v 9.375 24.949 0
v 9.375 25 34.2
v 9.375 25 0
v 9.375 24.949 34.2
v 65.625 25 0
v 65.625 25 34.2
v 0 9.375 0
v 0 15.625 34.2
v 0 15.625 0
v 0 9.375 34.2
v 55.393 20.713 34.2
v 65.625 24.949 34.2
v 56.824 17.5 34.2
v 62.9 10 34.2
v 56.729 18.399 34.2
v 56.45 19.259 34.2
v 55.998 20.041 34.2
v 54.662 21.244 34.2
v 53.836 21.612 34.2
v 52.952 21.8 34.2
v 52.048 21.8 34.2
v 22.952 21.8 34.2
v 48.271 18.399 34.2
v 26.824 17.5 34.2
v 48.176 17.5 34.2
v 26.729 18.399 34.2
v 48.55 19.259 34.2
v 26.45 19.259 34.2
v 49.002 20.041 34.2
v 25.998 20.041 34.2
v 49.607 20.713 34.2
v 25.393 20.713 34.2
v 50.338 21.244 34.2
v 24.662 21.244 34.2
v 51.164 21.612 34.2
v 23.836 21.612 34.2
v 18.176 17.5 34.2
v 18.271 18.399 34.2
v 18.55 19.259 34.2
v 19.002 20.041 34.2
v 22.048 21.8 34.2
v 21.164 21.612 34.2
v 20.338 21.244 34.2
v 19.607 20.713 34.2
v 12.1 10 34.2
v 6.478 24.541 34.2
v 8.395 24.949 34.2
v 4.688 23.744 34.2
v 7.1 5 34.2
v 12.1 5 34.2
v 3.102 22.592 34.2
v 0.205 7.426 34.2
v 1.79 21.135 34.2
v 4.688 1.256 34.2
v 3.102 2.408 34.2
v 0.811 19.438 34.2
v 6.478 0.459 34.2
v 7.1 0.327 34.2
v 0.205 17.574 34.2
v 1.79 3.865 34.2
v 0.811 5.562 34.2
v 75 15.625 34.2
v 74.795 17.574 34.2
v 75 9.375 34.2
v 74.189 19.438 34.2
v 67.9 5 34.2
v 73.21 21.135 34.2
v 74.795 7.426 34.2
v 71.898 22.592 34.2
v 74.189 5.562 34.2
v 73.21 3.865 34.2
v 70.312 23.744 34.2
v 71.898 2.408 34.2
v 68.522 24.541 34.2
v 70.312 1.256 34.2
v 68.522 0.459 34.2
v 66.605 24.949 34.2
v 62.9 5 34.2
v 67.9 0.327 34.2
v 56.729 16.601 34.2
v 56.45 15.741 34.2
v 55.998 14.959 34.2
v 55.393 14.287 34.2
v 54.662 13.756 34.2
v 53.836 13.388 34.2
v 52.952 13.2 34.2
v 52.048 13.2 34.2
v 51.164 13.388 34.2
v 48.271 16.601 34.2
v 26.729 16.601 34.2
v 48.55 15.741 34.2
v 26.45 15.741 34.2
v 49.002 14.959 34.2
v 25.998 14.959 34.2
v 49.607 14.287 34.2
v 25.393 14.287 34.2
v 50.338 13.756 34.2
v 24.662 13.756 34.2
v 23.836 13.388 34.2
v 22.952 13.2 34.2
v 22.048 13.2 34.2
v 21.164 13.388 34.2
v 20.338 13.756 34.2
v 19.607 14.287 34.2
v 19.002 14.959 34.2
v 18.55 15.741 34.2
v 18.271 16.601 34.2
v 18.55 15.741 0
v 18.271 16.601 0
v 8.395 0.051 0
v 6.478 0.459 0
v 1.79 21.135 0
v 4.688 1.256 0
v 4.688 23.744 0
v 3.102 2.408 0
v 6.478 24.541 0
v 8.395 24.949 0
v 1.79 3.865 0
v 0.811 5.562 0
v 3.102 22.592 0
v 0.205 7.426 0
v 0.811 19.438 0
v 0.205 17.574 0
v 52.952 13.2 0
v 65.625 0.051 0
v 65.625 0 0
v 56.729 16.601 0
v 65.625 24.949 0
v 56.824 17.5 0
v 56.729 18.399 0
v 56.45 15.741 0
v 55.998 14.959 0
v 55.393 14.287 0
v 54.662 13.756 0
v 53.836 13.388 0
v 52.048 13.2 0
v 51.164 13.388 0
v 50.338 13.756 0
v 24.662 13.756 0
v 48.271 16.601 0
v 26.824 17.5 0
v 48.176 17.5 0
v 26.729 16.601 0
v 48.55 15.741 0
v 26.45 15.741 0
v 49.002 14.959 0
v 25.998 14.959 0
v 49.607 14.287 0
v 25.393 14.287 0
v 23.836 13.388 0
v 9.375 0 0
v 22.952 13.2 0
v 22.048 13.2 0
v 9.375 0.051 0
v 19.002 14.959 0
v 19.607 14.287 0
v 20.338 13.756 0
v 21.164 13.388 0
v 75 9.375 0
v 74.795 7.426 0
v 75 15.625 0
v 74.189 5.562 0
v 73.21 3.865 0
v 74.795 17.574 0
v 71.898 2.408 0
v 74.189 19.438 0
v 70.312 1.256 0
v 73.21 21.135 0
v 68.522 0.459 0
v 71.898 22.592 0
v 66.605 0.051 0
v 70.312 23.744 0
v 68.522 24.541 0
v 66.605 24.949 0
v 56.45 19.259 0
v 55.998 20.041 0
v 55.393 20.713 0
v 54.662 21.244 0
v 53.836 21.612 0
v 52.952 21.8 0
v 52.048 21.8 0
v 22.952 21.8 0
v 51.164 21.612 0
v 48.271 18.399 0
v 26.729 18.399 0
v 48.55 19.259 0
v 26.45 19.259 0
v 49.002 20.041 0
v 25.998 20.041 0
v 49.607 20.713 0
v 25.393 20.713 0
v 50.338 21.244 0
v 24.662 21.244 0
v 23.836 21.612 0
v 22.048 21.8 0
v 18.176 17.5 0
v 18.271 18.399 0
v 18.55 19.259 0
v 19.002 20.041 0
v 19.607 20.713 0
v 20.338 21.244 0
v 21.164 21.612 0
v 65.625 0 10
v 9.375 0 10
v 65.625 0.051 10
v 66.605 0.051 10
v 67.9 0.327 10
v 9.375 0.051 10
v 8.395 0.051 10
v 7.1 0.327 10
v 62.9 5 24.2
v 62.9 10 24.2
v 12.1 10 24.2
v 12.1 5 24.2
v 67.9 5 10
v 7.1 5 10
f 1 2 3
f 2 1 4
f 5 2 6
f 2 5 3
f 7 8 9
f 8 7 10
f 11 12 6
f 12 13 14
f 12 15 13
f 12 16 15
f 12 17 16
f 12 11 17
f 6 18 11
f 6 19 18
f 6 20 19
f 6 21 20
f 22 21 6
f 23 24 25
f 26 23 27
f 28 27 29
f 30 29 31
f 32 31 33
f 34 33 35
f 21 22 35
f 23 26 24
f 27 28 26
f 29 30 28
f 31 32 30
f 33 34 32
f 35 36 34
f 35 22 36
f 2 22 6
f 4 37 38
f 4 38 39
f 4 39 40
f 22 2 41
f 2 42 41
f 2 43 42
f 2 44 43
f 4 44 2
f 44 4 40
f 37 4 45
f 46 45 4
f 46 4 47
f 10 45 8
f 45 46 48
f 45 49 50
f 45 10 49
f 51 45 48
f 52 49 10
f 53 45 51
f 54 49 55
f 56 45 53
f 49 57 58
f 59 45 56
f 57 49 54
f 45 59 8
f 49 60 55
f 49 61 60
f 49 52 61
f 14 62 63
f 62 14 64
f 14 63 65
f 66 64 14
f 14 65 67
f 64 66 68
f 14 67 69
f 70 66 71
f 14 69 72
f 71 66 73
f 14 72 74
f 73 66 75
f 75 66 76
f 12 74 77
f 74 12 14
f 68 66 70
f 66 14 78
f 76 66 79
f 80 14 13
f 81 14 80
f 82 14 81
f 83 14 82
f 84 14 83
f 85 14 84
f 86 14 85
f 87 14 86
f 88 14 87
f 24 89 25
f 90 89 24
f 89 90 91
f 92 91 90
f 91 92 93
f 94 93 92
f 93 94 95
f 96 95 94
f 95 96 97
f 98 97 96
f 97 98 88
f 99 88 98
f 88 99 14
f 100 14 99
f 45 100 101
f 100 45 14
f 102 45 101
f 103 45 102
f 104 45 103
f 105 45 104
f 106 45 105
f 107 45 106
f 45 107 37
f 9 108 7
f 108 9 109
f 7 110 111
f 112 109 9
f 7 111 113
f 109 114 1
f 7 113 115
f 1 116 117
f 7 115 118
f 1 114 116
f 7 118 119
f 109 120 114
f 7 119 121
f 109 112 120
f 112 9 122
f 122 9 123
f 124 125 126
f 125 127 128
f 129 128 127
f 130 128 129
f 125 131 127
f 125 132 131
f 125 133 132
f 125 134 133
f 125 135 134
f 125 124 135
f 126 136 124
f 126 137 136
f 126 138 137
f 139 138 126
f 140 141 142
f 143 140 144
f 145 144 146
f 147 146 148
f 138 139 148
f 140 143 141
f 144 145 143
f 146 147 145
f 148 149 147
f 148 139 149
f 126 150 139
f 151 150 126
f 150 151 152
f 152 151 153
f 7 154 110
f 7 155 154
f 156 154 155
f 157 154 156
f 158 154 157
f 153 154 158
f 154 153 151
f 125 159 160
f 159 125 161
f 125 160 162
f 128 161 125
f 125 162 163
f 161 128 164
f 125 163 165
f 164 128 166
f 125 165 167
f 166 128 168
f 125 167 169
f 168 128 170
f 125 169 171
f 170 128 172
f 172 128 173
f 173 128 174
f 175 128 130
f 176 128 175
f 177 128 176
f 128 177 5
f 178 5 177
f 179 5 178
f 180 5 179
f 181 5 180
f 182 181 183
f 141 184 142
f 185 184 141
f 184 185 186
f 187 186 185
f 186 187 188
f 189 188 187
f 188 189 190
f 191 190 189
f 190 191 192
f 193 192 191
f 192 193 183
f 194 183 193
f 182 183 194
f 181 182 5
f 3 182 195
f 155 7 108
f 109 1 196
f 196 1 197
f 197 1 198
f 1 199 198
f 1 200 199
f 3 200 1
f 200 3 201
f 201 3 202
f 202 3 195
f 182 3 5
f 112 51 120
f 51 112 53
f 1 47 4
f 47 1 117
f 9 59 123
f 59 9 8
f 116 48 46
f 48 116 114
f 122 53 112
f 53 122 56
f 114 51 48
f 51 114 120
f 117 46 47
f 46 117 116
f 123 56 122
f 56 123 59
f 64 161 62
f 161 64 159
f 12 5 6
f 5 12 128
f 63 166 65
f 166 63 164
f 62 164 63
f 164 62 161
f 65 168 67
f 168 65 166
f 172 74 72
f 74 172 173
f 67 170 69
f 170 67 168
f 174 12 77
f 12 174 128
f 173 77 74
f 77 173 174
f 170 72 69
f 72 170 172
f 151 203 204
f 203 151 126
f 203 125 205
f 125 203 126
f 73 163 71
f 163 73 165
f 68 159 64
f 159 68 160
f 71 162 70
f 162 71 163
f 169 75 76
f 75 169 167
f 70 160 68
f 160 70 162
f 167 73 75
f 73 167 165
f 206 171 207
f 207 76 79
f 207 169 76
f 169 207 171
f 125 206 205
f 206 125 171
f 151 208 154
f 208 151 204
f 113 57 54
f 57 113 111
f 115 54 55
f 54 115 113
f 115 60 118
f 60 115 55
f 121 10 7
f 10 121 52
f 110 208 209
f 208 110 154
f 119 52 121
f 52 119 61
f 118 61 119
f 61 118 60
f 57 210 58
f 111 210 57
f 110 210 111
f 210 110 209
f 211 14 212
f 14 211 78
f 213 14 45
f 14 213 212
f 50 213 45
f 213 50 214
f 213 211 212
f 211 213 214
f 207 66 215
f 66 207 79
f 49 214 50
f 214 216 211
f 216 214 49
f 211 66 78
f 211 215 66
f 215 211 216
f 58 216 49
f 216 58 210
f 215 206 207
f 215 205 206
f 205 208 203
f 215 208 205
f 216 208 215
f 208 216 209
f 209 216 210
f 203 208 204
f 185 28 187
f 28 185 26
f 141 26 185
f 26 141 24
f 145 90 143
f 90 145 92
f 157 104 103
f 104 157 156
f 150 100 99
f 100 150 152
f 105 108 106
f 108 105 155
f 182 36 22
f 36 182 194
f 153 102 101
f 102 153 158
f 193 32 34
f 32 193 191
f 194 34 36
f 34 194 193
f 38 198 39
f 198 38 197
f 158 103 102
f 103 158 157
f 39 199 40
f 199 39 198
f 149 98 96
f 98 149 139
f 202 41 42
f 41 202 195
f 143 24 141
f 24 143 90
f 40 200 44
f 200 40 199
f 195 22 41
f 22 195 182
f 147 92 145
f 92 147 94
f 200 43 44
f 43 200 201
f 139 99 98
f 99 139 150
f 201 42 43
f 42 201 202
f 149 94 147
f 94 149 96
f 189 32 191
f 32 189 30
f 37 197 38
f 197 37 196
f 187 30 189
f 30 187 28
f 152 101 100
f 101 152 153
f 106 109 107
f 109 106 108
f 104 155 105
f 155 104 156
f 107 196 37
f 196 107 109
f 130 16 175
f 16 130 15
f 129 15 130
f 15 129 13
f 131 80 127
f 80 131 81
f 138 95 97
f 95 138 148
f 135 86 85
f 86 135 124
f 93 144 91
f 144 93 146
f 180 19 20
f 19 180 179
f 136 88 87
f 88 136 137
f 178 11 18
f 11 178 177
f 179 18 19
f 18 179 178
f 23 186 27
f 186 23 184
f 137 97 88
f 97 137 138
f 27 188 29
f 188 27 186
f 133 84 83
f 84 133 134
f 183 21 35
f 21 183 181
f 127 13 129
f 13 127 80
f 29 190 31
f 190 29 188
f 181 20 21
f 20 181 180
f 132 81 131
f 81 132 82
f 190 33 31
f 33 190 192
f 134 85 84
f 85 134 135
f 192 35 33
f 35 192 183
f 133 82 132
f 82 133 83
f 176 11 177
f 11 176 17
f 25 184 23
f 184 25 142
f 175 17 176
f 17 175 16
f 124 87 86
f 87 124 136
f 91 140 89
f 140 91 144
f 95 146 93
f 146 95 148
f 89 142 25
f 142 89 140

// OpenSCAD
/* [Common] */

//Which part to customize
part=2; //[1:End Piece,2:Mid Piece]
//Distance between the holes for the threaded rods. Should be the same for all pieces.
rod_hole_distance = 30;
//Radius for the threaded rod holes. I found a radius of 4.3mm (8.6 diameter) worked for M8 rod in PLA.
rod_hole_radius = 4.3;
//Number of fragments for the curved surfaces.
curve_resolution = 30; // [10:60]
//Overall width of the piece. Limits the maximum width of a "cut out" on a Mid Piece. Can be different for different pieces.
base_width = 75;

/* [Mid Piece] */

//Height before any stone cut-outs.
base_height = 15;
//"Extra" depth for the middle piece, if this is 0 the last cut-out won't have a back.
base_extra_depth = 10;
//Series of numbers for each stones cut-out of the form: Width1,Depth1,Height1;Width2,Depth2,Height3... Hint: if you have two stones near in size (say 6" and 7") you can put the shorter stone in as the first "cut" and then the second with a depth of half the difference (7" - 6" = 1" / 2 = 12.7ish) (some prototyping may be necessary though)
cut_outs = "50.8,10,5;60.8,14.2,5";

/* [End Piece] */
//Height of the end piece
end_height = 45;
//Depth of the end piece.
end_depth = 50;

//Depth of the notch cut out for fitting in the sink
notch_depth = 25;
//Height of the notch cut out for fitting in the sink
notch_height=28;

/* [Hidden] */



if (part == 1) end_piece();
else mid_piece();

/* ----- Modules/Functions ----- */

//These functions are (shamelessly) copy/pasted from jepler's reply at:
//https://www.thingiverse.com/groups/openscad/topic:10294
function substr(s, st, en, p="") =
    (st >= en || st >= len(s))
        ? p
        : substr(s, st+1, en, str(p, s[st]));

function split(h, s, p=[]) =
    let(x = search(h, s)) 
    x == []
        ? concat(p, s)
        : let(i=x[0], l=substr(s, 0, i), r=substr(s, i+1, len(s)))
                split(h, r, concat(p, l));


//Functions for getting the sum of values inside a 2 dimensional array
function vector_vector_sum(vector, sub_index) = vector_vector_sum_s(vector,sub_index, 0);
function vector_vector_sum_s(vector, sub_index, index) = 
    index == len(vector) - 1 ? vector[index][sub_index] : vector[index][sub_index] + vector_vector_sum_s(vector,sub_index,index+1);
function vector_vector_sum_range(vector, sub_index, start_index, end_index) = 
    start_index == end_index ? vector[start_index][sub_index]
                             : vector[start_index][sub_index] 
                               + vector_vector_sum_range(vector, 
                                    sub_index, 
                                    start_index + 1,
                                    end_index);

//Functions to (painfully) convert strings to floats
function str_to_float(string) =
    let(dec_point = search(".",string), 
        pow= dec_point == [] ? len(string) - 1 : dec_point[0] - 1)
        stf(string,pow,0);
    
function stf(string, power, val) =
    len(string) == 0 ? val : 
        string[0] == "." ? stf(substr(string,1,len(string)),power,val) : 
            stf(substr(string,1,len(string)), power-1, val + (pow(10,power) * chr_to_int(string[0])));
function chr_to_int(char) =
    len(char) != 1 ? 0 :
        char == "0" ? 0 :
        char == "1" ? 1 :
        char == "2" ? 2 :
        char == "3" ? 3 :
        char == "4" ? 4 :
        char == "5" ? 5 :
        char == "6" ? 6 :
        char == "7" ? 7 :
        char == "8" ? 8 :
        char == "9" ? 9 :
        0;
function find_bad_cuts(cuts, i) =
    i >= len(cuts) ? -1 : len(cuts[i]) != 3 ? i : find_bad_cuts(cuts, i + 1);

module mid_piece() {
    cuts = [for (i = split(";",cut_outs)) [for (j = split(",",i)) str_to_float(j)] ];
    bad_cut= find_bad_cuts(cuts,0);
    
    if (bad_cut >= 0) {
        linear_extrude(height=10) {
            text(text=str("Bad cut format at ", bad_cut),size=20,font="Liberation Sans");
        }
    }
    else {
        total_height = base_height + vector_vector_sum(cuts,2);
        total_depth = base_extra_depth + vector_vector_sum(cuts,1);

        translate([0,total_height,0])
        rotate([90,0,0])
        difference() {
            rounded_cube([base_width,total_depth, total_height],$fn=curve_resolution);
            
            translate([(base_width-rod_hole_distance)/2,0, base_height/2 ])
            rotate([-90,0,0])
            cylinder_outer(total_depth,rod_hole_radius,curve_resolution);

            translate([(base_width-rod_hole_distance)/2+rod_hole_distance,0, base_height/2 ])
            rotate([-90,0,0])
            cylinder_outer(total_depth,rod_hole_radius,curve_resolution);

            for (i = [0:len(cuts)-1]) {
                translate([(base_width - cuts[i][0])/2, 
                           total_depth - vector_vector_sum_range(cuts,1,0,i),
                           base_height + (i-1 >= 0 ? vector_vector_sum_range(cuts,2,0,i-1) : 0)])
                color("red")
                cube([cuts[i][0],total_depth,total_height]);
                           
            }

        }
    }
}

module end_piece() {
    translate([0,0,end_depth])
    rotate([-90,0,0])
    difference() {
        rounded_cube([base_width,end_depth,end_height],$fn=curve_resolution);
        translate([(base_width-rod_hole_distance)/2,0,end_height - (end_height - notch_height)/2 ])
        rotate([-90,0,0])
        cylinder_outer(end_depth,rod_hole_radius,curve_resolution);
        translate([(base_width-rod_hole_distance)/2 + rod_hole_distance,0,end_height - (end_height - notch_height)/2 ])
        rotate([-90,0,0])
        cylinder_outer(end_depth,rod_hole_radius,curve_resolution);
        translate([-0.5*base_width,notch_depth,-notch_height])
        rotate([0,0,-90])
        rounded_cube([end_depth,base_width*2,notch_height*2],$fn=curve_resolution);
    }
}

/**
 * Creates a cube with the edges that run parrallel to the y-axis are rounded. Cube is un-centered.
 * @param xyz 3 length array, dimensions in x, y, and z planes
 * @param r_edge Optional. How far from the corner to start rounding the edge. Default is 1/8 of the x dimension.
 * @param r Optional. Radius of the cylinder that is used to round the edge. default is equal to r_edge.
 */
module rounded_cube(xyz = [1,1,1], r_edge = -1,r = -1) {
    if (len(xyz) == 3) {
        i_edge = r_edge < 0 ? xyz[0] * 0.125 : r_edge;
        i_rad = r < 0 ? i_edge : r;
        i_c = sqrt(2*pow(i_edge,2));
        i_ang = 45 - asin(i_c/(2*i_rad));
        i_cyl_d = i_rad*sin(i_ang);
        difference() {
            cube(size = xyz);
            //bottom left
            difference() {
                cube(size=[i_edge,xyz[1],i_edge]);

                translate([i_edge+i_cyl_d,0,i_edge+i_cyl_d])
                rotate([-90,0,0])
                cylinder(r=i_rad,h=xyz[1]);
            }
            //bottom right
            translate([xyz[0]-i_edge,0,0]) {
            difference() {
                cube(size=[i_edge,xyz[1],i_edge]);

                translate([-i_cyl_d,0,i_edge+i_cyl_d])
                rotate([-90,0,0])
                cylinder(r=i_rad,h=xyz[1]);
            }}
            //top right
            translate([xyz[0]-i_edge,0,xyz[2]-i_edge]) {
            difference() {
                cube(size=[i_edge,xyz[1],i_edge]);

                translate([-i_cyl_d,0,-i_cyl_d])
                rotate([-90,0,0])
                cylinder(r=i_rad,h=xyz[1]);
            }}
            //top right
            translate([0,0,xyz[2]-i_edge]) {
            difference() {
                cube(size=[i_edge,xyz[1],i_edge]);

                translate([i_edge+i_cyl_d,0,-i_cyl_d])
                rotate([-90,0,0])
                cylinder(r=i_rad,h=xyz[1]);
            }}
        }
    }
    else
    {
        echo("WARN: module rounded_cube, expected xyz len 3 got", len(xyz));
    }
}

/**
 * Creates a cylinder that is at minimum radius in all angles. 
 * Default cylinders are "inscribed" where the points of their approximations lie on the circle at radius, leading to a slightly smaller than defined cylinder.
 * @param height Height of the cylinder.
 * @param radius Radius of the cylinder.
 * @fn Number of facets. Required because the extra length of the radius depends on how many sides the cylinder approximation uses.
 */
module cylinder_outer(height,radius,fn){
   extra_r = 1/cos(180/fn);
   cylinder(h=height,r=radius*extra_r,$fn=fn);
}
